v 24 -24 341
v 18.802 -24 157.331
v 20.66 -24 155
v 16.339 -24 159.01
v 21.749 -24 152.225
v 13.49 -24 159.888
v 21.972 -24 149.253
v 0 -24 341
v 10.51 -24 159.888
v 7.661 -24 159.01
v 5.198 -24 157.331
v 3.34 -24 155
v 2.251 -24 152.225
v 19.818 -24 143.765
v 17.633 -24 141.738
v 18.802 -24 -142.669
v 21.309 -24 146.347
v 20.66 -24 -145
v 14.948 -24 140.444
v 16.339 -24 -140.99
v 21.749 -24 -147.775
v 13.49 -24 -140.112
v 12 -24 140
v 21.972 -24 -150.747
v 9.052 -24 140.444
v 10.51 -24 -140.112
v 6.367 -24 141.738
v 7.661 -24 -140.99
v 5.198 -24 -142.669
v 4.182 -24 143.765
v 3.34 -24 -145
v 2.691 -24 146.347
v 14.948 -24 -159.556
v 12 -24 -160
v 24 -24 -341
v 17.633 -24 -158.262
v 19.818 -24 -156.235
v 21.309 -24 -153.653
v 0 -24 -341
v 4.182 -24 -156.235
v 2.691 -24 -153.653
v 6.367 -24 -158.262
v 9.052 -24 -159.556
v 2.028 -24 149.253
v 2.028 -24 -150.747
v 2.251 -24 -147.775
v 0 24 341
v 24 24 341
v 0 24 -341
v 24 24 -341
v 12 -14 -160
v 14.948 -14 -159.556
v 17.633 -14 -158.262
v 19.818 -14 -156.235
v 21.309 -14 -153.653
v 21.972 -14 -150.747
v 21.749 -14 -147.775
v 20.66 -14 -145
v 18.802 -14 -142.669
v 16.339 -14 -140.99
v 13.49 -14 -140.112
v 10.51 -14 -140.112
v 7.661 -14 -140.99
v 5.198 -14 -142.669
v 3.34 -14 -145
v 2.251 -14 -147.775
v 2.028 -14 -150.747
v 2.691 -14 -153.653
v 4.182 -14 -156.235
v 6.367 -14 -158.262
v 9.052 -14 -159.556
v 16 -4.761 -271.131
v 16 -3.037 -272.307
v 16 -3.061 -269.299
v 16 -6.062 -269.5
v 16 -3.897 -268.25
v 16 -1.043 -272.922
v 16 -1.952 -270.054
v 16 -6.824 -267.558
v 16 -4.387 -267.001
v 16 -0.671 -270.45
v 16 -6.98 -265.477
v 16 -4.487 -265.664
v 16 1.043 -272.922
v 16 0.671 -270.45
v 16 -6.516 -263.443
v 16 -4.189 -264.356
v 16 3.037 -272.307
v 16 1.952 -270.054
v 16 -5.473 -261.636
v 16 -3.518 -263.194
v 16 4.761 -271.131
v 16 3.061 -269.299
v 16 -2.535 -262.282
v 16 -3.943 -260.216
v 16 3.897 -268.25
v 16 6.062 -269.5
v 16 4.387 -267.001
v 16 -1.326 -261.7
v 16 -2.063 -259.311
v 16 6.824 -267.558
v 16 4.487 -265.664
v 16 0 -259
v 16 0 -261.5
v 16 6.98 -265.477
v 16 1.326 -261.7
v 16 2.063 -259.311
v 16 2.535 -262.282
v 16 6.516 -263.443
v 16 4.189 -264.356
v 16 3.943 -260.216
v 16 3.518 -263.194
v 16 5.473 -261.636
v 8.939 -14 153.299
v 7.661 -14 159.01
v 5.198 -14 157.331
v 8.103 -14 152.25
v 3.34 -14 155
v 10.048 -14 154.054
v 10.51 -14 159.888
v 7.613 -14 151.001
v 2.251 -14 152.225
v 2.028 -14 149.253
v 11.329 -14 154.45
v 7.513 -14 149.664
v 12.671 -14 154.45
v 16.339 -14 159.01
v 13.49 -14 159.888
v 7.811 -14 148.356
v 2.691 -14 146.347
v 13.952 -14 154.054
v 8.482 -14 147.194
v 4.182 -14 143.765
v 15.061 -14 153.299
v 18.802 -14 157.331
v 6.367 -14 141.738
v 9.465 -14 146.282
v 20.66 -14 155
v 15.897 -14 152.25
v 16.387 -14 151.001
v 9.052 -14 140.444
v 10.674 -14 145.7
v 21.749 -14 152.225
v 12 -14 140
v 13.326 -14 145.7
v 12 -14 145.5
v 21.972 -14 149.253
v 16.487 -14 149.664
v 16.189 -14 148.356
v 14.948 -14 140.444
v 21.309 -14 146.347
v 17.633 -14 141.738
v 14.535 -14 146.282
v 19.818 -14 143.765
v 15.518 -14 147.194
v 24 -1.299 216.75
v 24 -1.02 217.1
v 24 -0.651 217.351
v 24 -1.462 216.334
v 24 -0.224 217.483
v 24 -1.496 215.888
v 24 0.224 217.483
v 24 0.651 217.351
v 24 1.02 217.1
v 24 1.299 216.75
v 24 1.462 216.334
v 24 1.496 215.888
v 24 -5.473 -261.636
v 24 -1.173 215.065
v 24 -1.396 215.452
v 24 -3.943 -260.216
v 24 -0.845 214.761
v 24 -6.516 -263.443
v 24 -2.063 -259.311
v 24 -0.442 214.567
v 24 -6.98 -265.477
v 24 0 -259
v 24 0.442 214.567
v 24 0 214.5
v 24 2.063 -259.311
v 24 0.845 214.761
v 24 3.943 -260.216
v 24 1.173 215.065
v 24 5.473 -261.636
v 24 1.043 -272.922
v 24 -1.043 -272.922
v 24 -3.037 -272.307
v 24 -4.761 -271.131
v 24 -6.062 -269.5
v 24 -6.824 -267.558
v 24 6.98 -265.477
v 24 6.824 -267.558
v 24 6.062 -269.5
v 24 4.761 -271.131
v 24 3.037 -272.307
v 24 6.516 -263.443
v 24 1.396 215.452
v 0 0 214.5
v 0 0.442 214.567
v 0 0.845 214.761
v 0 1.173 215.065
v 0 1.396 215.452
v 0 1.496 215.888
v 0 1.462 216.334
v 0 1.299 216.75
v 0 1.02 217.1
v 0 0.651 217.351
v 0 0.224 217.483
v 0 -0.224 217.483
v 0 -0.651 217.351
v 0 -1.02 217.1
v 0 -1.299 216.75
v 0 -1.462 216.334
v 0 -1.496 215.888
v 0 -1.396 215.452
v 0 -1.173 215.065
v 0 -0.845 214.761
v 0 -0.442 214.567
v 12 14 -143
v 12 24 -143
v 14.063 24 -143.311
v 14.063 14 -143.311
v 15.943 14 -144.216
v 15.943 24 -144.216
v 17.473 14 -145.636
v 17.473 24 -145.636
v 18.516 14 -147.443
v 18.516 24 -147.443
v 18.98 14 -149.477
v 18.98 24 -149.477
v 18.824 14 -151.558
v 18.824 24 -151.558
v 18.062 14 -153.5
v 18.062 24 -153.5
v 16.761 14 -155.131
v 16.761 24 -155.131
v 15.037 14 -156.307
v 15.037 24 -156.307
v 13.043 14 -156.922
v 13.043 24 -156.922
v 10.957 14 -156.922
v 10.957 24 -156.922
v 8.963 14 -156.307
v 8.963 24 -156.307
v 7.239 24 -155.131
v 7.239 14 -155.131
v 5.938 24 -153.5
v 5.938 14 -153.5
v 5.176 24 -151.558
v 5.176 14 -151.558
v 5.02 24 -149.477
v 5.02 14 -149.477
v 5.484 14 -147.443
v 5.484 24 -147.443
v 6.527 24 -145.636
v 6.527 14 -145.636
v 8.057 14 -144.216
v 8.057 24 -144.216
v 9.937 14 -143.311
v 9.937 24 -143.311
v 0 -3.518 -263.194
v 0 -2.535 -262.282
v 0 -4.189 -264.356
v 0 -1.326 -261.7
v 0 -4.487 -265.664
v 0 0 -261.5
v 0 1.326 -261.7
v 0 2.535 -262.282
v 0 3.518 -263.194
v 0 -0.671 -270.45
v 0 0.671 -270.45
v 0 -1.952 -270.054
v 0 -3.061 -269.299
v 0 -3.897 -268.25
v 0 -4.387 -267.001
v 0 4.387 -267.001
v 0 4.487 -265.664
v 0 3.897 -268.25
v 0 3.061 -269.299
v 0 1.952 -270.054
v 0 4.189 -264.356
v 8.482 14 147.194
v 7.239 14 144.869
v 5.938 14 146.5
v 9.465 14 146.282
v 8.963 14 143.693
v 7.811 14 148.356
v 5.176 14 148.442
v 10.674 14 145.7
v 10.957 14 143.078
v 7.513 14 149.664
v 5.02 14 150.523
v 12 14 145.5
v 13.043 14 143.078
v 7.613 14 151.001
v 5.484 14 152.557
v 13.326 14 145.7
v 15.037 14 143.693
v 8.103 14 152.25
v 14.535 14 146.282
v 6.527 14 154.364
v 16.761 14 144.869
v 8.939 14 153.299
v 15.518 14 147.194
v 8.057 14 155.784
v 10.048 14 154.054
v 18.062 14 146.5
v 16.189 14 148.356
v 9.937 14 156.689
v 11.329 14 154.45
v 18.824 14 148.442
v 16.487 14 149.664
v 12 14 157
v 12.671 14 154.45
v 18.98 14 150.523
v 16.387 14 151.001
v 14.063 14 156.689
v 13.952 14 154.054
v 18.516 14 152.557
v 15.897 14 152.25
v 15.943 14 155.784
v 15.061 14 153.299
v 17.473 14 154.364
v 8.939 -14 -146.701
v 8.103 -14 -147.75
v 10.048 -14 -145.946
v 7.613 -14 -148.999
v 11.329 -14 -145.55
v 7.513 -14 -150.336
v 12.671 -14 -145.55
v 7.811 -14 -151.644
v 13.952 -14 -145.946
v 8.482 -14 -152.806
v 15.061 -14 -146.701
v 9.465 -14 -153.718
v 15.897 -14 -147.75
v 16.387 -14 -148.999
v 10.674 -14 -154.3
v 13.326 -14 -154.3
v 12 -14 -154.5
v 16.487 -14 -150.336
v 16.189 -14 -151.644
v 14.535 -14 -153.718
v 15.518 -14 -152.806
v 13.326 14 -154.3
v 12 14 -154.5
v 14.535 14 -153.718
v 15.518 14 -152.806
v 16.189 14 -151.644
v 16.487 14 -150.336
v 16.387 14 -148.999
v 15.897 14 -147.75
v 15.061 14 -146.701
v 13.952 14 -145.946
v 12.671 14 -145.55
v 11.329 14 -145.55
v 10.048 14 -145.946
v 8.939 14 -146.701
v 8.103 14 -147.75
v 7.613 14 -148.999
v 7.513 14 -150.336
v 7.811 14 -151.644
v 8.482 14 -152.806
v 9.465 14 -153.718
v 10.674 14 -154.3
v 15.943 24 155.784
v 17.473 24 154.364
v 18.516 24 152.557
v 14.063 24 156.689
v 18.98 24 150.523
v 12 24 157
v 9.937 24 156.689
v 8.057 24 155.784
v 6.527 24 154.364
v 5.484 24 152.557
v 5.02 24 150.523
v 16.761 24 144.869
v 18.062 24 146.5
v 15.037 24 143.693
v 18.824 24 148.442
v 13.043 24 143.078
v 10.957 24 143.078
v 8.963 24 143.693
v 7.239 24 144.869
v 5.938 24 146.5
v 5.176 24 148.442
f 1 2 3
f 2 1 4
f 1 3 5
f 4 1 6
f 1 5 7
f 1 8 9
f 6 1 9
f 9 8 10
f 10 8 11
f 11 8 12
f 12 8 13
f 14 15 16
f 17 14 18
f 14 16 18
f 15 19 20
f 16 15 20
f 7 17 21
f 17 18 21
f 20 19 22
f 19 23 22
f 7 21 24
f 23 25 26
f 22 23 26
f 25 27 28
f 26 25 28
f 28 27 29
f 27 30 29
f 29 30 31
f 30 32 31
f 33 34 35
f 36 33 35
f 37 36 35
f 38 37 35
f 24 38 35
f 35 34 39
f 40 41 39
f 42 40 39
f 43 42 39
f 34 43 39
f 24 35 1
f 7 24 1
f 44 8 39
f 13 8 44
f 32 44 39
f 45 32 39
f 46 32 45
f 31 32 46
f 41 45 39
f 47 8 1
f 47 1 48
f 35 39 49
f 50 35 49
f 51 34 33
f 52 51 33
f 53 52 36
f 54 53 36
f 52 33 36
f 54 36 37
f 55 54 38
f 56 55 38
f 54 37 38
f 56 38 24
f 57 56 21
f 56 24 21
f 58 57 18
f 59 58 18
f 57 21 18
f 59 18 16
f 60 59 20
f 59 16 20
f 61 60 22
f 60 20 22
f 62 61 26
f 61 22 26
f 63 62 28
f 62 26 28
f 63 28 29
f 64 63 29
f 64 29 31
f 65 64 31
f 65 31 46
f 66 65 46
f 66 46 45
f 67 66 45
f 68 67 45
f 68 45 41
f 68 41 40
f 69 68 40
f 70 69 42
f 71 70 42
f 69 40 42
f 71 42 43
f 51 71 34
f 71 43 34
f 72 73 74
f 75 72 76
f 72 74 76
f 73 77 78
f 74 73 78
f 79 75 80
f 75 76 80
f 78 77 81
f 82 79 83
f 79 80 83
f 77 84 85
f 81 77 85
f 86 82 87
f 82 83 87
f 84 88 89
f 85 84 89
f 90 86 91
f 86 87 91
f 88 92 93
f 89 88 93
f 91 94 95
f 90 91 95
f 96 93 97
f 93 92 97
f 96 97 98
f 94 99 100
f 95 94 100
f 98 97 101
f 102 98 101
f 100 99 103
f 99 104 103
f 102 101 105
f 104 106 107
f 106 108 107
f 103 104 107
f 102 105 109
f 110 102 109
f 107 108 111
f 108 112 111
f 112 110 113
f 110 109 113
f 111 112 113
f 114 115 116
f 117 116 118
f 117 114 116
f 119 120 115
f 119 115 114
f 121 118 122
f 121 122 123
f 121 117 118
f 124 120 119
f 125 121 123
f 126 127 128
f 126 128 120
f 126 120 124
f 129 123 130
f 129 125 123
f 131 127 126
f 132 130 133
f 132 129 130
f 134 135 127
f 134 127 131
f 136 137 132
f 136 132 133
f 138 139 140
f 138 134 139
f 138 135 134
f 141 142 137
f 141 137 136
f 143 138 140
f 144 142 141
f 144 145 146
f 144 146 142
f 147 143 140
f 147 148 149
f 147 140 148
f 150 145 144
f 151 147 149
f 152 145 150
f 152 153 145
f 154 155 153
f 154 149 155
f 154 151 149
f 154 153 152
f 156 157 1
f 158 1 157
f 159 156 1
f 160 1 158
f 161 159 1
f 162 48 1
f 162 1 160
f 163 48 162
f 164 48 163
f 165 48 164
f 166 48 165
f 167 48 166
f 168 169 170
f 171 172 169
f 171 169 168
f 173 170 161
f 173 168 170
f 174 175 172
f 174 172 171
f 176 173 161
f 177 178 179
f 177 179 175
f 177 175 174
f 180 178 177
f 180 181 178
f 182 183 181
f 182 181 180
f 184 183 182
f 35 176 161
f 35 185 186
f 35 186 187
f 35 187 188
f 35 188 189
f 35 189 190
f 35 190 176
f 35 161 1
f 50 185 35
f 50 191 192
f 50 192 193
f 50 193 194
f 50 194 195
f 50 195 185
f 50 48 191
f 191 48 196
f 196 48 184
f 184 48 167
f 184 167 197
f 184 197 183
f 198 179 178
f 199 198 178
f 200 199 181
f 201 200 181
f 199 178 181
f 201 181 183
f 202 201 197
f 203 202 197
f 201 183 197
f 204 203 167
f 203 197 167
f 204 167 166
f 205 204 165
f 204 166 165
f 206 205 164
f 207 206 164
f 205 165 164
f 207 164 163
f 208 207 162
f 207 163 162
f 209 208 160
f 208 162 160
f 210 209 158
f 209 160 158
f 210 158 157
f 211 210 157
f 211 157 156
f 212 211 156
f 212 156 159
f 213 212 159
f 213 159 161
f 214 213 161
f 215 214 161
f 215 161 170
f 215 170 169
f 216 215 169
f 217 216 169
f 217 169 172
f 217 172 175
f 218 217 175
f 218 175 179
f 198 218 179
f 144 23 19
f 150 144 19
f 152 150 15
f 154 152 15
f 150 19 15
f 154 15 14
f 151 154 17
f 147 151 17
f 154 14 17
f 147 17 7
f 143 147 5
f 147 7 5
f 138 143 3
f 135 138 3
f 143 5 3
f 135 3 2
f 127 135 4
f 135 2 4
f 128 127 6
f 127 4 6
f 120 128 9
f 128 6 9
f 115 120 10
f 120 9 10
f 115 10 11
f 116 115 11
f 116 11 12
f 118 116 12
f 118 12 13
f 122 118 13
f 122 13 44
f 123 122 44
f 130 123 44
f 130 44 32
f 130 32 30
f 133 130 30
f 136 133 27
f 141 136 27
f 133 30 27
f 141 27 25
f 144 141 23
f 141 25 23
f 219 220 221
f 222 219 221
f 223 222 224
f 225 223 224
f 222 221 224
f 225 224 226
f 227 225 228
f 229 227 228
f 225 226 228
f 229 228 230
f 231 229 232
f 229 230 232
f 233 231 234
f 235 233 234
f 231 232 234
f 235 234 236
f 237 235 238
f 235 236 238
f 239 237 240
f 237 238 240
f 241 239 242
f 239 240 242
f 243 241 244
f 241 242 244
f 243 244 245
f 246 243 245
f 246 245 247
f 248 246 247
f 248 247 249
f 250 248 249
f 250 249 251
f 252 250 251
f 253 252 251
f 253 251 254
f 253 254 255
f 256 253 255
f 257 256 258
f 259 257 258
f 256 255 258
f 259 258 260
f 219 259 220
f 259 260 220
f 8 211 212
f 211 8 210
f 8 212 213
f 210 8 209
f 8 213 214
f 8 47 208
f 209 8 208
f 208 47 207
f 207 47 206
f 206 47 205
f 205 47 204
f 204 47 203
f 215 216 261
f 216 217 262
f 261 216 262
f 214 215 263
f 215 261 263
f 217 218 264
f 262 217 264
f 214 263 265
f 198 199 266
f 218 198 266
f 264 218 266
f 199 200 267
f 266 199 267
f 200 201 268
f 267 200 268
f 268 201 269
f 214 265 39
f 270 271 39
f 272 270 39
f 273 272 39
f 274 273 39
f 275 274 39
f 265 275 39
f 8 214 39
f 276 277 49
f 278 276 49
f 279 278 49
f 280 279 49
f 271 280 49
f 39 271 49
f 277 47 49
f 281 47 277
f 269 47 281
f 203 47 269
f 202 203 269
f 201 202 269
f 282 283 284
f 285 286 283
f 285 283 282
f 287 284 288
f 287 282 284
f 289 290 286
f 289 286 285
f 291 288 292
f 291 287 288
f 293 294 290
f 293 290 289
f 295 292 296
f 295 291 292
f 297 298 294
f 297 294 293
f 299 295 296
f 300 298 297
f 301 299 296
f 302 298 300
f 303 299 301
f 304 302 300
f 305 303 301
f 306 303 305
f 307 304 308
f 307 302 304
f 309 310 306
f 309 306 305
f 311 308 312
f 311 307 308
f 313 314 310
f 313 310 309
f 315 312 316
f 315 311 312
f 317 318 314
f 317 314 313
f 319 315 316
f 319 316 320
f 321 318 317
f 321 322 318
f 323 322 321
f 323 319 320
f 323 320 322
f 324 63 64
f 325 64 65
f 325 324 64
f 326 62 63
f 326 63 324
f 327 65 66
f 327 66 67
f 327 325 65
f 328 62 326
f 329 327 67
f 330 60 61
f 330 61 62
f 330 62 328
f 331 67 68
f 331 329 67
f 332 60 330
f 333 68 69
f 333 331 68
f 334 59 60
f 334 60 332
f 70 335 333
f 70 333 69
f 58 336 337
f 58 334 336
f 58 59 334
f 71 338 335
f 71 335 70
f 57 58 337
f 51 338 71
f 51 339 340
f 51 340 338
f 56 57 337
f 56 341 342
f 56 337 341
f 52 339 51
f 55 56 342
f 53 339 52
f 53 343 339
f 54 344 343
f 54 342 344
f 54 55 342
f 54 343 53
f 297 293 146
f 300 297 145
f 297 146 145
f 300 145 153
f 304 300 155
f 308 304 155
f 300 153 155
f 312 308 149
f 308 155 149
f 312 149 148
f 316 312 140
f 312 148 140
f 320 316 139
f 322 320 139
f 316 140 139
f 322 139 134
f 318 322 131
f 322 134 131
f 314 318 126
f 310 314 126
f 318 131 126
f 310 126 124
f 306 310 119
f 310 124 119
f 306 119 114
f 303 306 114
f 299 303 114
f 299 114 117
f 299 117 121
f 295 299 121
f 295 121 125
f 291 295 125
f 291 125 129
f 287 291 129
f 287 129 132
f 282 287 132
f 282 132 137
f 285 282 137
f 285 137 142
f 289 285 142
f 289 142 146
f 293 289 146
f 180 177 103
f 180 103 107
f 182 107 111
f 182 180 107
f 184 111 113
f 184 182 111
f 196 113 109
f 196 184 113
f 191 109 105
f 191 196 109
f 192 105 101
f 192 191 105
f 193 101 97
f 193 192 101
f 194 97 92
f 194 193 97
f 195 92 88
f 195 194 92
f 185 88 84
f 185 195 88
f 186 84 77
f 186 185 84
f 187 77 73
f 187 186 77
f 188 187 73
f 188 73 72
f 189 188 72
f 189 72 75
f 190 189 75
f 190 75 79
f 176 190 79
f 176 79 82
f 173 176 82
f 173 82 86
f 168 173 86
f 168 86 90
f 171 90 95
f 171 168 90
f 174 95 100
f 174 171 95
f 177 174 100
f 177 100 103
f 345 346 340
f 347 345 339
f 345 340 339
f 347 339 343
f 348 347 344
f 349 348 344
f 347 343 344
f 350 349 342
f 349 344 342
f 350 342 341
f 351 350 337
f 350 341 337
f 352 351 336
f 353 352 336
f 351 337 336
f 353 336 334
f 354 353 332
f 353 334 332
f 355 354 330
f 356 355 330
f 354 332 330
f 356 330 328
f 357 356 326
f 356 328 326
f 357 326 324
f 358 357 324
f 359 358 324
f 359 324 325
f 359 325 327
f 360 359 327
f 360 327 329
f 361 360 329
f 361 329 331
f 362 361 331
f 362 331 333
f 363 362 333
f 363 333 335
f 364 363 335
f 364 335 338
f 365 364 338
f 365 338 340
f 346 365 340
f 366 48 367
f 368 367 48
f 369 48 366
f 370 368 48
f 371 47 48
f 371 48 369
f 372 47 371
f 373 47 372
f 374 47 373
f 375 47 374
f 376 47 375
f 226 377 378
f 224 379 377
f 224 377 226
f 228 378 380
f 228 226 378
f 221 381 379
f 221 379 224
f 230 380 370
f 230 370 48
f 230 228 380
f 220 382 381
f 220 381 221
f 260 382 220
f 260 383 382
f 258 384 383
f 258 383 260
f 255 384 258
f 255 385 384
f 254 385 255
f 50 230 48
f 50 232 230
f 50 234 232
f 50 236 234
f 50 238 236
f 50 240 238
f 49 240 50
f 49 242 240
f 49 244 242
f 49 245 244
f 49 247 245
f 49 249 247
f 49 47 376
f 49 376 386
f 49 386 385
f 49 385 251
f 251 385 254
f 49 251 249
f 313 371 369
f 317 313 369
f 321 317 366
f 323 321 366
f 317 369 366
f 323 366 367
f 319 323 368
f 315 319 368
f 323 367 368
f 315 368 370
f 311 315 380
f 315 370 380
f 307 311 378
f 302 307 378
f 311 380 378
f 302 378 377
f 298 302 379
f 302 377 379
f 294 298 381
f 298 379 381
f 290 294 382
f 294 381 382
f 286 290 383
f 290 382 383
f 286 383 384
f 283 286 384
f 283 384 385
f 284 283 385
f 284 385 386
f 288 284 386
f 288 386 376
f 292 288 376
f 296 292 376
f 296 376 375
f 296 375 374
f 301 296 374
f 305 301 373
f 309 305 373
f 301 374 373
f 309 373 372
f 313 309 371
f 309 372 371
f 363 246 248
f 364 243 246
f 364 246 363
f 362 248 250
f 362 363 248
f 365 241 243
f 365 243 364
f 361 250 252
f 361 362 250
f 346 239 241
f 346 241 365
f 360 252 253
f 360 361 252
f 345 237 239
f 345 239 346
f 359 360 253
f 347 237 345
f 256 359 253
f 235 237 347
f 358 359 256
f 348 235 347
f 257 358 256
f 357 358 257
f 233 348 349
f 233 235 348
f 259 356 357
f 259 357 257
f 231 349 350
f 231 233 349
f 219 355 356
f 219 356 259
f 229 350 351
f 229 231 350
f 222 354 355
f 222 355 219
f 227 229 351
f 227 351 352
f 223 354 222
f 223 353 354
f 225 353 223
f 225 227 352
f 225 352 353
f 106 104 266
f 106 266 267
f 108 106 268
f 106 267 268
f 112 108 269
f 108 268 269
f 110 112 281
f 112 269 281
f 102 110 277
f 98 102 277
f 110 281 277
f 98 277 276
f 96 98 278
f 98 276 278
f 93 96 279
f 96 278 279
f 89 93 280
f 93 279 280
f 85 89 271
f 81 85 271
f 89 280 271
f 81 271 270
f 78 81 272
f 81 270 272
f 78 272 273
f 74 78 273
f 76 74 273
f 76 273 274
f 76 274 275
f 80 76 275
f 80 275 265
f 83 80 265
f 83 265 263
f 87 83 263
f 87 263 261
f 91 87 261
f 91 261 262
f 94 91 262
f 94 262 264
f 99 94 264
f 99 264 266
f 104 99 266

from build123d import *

# Parameters (mm, degrees)
ESQUISSE1_W             = 682
ESQUISSE1_H             = 48
BOSS_EXTRU_1_DEPTH      = 24
ESQUISSE2_R             = 4.5
ENL_V_MAT_EXTRU_1_DEPTH = 346.197045179
ESQUISSE3_R             = 10
ENL_V_MAT_EXTRU_2_DEPTH = 10
ESQUISSE4_R             = 7
ENL_V_MAT_EXTRU_3_DEPTH = 10
ESQUISSE5_R             = 1.5
ENL_V_MAT_EXTRU_4_DEPTH = 343.68498654
ESQUISSE6_R             = 4.5
ENL_V_MAT_EXTRU_5_DEPTH = 343.68498654
ESQUISSE7_R             = 7
ENL_V_MAT_EXTRU_6_DEPTH = 8


with BuildPart() as part:
    # Esquisse1 → Boss.-Extru.1 (new body)
    with BuildSketch(Plane(origin=(0, 0, 0), x_dir=(0, 0, -1), z_dir=(1, 0, 0))):
        Rectangle(ESQUISSE1_W, ESQUISSE1_H)
    extrude(amount=BOSS_EXTRU_1_DEPTH)

    # Esquisse2 → Enlèv. mat.-Extru.1 (cut, through all)
    with BuildSketch(Plane.XZ.offset(24)):
        with Locations(Location((12, 150, 0), (0, 0, 270))):
            Circle(ESQUISSE2_R)
        with Locations(Location((12, -150, 0), (0, 0, 270))):
            Circle(ESQUISSE2_R)
    extrude(amount=-ENL_V_MAT_EXTRU_1_DEPTH, mode=Mode.SUBTRACT)

    # Esquisse3 → Enlèv. mat.-Extru.2 (cut)
    with BuildSketch(Plane.XZ.offset(24)):
        with Locations(Location((12, 150, 0), (0, 0, 270))):
            Circle(ESQUISSE3_R)
        with Locations(Location((12, -150, 0), (0, 0, 270))):
            Circle(ESQUISSE3_R)
    extrude(amount=-ENL_V_MAT_EXTRU_2_DEPTH, mode=Mode.SUBTRACT)

    # Esquisse4 → Enlèv. mat.-Extru.3 (cut)
    with BuildSketch(Plane(origin=(0, 24, 0), x_dir=(-1, 0, 0), z_dir=(0, 1, 0))):
        with Locations(Location((-12, 150, 0), (0, 0, 90))):
            Circle(ESQUISSE4_R)
        with Locations(Location((-12, -150, 0), (0, 0, 90))):
            Circle(ESQUISSE4_R)
    extrude(amount=-ENL_V_MAT_EXTRU_3_DEPTH, mode=Mode.SUBTRACT)

    # Esquisse5 → Enlèv. mat.-Extru.4 (cut, through all)
    with BuildSketch(Plane(origin=(24, 0, 0), x_dir=(0, 0, -1), z_dir=(1, 0, 0))):
        with Locations((-216, 0)):
            Circle(ESQUISSE5_R)
    extrude(amount=-ENL_V_MAT_EXTRU_4_DEPTH, mode=Mode.SUBTRACT)

    # Esquisse6 → Enlèv. mat.-Extru.5 (cut, through all)
    with BuildSketch(Plane.ZY):
        with Locations((-266, 0)):
            Circle(ESQUISSE6_R)
    extrude(amount=-ENL_V_MAT_EXTRU_5_DEPTH, mode=Mode.SUBTRACT)

    # Esquisse7 → Enlèv. mat.-Extru.6 (cut)
    with BuildSketch(Plane.ZY.offset(-24)):
        with Locations((-266, 0)):
            Circle(ESQUISSE7_R)
    extrude(amount=ENL_V_MAT_EXTRU_6_DEPTH, mode=Mode.SUBTRACT)


solid = part.part
